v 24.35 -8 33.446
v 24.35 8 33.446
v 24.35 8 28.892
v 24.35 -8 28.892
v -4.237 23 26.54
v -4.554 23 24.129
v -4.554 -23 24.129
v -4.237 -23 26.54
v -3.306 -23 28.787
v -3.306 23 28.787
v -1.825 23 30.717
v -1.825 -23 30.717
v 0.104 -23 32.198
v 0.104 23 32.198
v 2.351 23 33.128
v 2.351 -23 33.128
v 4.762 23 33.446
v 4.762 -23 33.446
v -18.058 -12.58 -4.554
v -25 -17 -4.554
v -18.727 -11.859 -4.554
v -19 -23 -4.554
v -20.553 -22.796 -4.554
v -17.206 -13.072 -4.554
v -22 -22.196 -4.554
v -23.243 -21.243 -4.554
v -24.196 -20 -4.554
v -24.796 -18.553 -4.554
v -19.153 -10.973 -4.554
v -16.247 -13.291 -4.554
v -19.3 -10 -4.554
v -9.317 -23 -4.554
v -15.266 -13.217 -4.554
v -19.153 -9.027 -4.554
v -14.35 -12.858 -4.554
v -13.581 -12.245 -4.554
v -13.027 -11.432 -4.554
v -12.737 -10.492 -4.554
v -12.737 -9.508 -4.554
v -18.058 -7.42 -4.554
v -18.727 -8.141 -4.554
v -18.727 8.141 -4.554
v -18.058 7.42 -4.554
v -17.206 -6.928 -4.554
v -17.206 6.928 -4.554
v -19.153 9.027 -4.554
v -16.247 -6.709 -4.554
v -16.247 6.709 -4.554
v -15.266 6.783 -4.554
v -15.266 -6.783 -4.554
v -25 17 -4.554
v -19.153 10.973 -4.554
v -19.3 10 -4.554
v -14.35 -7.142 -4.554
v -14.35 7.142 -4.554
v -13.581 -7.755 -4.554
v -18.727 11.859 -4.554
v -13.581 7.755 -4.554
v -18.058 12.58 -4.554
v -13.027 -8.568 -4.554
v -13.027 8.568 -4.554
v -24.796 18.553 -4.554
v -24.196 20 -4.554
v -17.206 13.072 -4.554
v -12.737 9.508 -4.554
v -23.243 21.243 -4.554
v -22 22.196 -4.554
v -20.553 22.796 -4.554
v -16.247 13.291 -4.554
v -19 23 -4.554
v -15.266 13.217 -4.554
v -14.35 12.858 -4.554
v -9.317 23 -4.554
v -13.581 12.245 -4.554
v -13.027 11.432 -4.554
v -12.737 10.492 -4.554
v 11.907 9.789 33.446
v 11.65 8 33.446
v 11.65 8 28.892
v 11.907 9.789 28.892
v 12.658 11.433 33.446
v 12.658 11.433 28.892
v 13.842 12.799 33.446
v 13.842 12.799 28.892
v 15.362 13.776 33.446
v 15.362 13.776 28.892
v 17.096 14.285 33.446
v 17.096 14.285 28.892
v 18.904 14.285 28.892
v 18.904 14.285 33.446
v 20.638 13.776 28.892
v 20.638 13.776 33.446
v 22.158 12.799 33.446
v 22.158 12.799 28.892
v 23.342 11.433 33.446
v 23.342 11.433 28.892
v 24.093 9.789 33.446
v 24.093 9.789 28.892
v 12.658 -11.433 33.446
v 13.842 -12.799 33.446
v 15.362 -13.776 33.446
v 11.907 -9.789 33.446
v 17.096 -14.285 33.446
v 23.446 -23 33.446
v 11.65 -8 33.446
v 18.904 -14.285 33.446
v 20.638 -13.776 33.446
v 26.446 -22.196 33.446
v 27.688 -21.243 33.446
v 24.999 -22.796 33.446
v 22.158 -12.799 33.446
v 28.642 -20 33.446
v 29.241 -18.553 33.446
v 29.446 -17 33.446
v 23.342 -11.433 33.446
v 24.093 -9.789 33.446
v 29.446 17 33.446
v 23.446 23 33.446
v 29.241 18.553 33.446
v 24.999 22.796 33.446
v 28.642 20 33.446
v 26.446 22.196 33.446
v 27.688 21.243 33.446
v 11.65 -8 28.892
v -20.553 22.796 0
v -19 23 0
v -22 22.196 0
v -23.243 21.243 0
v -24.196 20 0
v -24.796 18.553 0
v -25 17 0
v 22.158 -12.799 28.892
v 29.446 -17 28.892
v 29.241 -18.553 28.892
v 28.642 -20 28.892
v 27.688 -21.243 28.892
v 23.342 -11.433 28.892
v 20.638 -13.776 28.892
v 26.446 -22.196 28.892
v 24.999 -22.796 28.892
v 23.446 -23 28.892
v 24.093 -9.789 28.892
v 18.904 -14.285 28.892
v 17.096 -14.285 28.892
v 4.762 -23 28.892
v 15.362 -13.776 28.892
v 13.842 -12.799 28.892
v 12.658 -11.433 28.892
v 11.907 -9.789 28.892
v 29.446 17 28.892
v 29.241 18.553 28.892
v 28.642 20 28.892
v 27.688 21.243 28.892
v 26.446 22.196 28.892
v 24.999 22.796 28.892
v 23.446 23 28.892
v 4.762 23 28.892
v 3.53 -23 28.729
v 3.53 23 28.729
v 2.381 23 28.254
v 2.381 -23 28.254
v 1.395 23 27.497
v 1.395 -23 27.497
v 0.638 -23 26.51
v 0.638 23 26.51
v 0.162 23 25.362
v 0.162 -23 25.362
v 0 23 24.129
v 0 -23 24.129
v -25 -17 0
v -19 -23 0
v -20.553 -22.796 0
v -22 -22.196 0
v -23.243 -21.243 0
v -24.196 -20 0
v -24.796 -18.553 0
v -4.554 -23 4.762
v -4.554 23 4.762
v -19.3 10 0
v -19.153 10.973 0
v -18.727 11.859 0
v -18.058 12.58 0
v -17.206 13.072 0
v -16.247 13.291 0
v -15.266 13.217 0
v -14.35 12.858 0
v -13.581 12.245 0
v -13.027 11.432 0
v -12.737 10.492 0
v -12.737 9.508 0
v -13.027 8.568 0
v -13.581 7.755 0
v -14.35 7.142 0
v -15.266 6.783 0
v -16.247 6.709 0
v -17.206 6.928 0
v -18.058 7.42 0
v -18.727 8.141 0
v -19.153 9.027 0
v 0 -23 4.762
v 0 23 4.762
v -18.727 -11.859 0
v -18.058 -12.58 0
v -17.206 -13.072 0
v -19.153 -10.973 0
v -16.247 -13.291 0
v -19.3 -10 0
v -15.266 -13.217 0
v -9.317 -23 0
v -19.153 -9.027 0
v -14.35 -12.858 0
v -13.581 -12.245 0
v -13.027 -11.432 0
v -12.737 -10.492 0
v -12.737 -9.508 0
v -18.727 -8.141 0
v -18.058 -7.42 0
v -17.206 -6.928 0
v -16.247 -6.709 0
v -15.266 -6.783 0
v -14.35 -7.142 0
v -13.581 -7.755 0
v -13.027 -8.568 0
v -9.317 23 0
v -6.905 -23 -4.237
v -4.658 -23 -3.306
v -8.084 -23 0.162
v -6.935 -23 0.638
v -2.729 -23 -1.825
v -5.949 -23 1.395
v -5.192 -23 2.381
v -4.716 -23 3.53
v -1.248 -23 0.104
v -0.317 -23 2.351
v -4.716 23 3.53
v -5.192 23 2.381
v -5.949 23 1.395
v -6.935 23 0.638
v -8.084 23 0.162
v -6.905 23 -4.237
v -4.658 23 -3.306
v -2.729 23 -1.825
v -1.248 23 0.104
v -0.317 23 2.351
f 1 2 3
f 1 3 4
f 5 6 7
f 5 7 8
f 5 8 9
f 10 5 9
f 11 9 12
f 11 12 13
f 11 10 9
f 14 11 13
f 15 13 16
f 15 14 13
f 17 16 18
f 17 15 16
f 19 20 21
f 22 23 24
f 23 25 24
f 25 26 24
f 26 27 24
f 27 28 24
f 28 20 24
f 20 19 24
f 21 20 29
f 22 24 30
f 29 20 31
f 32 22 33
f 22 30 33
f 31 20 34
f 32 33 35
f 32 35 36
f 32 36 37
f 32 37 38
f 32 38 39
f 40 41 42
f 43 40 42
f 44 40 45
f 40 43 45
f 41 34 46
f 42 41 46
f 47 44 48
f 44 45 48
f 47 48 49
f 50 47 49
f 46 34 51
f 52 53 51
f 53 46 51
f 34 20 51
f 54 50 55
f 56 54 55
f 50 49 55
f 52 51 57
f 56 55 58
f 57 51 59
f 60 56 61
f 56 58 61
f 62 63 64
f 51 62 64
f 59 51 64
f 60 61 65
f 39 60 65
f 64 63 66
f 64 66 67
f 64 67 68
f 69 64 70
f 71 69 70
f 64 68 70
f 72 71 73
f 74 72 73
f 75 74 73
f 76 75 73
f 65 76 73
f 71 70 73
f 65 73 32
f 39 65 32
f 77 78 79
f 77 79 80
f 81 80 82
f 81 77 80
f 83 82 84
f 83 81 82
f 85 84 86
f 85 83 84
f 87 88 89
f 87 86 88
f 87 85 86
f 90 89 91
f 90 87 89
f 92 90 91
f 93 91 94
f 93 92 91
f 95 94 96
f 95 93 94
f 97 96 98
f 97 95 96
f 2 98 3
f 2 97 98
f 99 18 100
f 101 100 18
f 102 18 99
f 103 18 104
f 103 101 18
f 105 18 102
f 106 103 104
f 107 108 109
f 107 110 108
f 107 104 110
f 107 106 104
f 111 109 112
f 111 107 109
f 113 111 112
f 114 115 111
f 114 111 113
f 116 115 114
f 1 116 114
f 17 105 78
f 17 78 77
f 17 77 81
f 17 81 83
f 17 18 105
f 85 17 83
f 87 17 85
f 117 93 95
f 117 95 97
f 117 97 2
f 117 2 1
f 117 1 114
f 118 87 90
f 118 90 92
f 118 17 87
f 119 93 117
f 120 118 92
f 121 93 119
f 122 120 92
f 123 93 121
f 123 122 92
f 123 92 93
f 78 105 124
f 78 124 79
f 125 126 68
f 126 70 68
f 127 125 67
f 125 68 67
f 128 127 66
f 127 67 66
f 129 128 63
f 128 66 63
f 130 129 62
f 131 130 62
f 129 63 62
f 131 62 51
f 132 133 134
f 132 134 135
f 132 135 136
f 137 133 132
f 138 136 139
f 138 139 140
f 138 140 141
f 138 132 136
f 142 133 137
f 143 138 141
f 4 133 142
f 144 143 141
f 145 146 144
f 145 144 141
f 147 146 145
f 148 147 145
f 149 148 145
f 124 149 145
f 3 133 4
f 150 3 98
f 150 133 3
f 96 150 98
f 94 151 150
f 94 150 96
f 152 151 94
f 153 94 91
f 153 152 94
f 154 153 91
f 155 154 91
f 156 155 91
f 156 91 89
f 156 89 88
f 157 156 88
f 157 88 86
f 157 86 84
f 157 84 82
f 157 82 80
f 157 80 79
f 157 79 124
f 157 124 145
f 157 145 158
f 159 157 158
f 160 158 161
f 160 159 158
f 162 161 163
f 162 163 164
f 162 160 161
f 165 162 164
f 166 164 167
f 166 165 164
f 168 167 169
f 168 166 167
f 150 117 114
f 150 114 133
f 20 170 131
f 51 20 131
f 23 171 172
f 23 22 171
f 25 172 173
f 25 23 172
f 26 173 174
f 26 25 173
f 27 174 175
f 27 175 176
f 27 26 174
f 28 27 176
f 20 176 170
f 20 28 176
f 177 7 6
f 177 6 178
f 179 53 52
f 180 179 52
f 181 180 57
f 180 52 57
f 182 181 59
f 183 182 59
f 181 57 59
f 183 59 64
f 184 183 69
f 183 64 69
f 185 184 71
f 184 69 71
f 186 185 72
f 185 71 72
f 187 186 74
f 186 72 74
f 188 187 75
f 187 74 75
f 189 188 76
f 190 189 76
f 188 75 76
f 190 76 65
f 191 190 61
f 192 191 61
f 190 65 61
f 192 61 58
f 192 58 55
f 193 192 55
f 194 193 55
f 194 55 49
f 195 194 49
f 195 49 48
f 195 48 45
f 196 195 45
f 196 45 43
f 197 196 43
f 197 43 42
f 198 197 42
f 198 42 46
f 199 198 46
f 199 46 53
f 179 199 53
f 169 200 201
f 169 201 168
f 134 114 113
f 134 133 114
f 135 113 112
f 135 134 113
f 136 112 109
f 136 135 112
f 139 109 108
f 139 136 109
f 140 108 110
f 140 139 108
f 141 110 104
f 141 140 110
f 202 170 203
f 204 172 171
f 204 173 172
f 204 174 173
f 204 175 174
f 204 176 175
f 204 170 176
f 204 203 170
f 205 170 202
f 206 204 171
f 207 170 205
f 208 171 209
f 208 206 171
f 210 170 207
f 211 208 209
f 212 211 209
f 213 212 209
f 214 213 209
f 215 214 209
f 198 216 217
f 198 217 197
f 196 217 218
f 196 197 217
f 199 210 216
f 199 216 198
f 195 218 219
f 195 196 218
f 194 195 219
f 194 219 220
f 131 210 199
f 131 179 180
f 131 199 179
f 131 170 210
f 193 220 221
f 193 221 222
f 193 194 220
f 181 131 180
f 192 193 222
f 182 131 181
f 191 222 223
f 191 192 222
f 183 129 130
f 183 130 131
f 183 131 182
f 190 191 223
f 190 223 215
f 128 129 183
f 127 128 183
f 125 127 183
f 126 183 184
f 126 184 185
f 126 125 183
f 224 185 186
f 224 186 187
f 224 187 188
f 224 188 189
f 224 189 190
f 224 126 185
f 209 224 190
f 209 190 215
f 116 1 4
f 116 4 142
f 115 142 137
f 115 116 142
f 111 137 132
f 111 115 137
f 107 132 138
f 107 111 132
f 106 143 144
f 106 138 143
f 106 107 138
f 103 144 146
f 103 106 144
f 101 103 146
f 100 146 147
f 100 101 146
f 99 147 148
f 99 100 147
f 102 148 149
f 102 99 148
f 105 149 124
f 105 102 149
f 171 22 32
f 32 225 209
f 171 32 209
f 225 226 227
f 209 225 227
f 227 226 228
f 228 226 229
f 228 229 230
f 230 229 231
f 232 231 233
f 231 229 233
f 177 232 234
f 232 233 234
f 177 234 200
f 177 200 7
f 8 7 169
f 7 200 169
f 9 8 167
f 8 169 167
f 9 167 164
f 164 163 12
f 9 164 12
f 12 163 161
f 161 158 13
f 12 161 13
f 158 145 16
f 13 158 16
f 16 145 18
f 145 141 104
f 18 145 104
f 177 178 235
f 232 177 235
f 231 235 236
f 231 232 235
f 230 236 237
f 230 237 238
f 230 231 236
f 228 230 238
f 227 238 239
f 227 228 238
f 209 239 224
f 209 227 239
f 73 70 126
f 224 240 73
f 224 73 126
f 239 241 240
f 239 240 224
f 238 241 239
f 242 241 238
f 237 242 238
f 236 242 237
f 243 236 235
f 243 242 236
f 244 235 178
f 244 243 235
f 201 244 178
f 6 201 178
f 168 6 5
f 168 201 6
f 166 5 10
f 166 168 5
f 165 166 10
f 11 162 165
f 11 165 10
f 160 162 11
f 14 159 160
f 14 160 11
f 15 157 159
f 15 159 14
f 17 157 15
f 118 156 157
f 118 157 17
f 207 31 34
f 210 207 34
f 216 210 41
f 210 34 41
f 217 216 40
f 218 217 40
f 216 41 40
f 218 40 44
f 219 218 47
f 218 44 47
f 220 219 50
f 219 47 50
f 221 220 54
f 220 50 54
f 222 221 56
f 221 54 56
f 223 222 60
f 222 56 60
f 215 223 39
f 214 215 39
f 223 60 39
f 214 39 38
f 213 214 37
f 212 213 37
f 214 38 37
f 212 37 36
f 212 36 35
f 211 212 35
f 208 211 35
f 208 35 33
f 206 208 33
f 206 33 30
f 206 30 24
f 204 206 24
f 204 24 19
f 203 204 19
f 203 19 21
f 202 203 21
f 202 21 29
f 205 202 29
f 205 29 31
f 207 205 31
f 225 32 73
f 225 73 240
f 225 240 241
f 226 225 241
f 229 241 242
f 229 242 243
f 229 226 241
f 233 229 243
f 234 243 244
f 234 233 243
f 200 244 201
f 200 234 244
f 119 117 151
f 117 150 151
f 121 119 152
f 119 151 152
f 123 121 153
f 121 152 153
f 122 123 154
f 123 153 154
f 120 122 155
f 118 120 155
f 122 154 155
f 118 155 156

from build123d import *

# Parameters (mm, degrees)
SKETCH1_W                    = 25
SKETCH1_H                    = 46
BASE_FLANGE1_DEPTH           = 4.55422
EDGE_FLANGE2_STRIP_W         = 27.74188
EDGE_FLANGE2_STRIP_H         = 4.55422
EDGE_FLANGE2_STRIP_CUT_DEPTH = 46
EDGE_FLANGE2_DEPTH           = 46
EDGE_FLANGE3_STRIP_W         = 27.74188
EDGE_FLANGE3_STRIP_H         = 4.55422
EDGE_FLANGE3_STRIP_CUT_DEPTH = 46
EDGE_FLANGE3_DEPTH           = 46
FILLET1_R                    = 6
M6_CLEARANCE_HOLE1_D         = 6.6
CUT_EXTRUDE1_DEPTH           = 76.830940915


# Sheet-metal steps are written as plain solids
with BuildPart() as part:
    # Sketch1 → Base-Flange1 (new body)
    with BuildSketch(Plane.XY):
        with Locations((-12.5, 0)):
            Rectangle(SKETCH1_W, SKETCH1_H)
    extrude(amount=-BASE_FLANGE1_DEPTH)

    # Edge-Flange2 strip (across the edge) → Edge-Flange2 strip cut (cut)
    with BuildSketch(Plane(origin=(0, -23, 0), x_dir=(-1, 0, 0), z_dir=(0, 1, 0))):
        with Locations((-4.55422, -2.27711)):
            Rectangle(EDGE_FLANGE2_STRIP_W, EDGE_FLANGE2_STRIP_H)
    extrude(amount=EDGE_FLANGE2_STRIP_CUT_DEPTH, mode=Mode.SUBTRACT)

    # Edge-Flange2 section (across the edge) → Edge-Flange2 (add)
    with BuildSketch(Plane(origin=(0, -23, 0), x_dir=(-1, 0, 0), z_dir=(0, 1, 0))):
        with BuildLine():
            Line((0, 4.7625), (0, 33.44578))
            Line((0, 33.44578), (4.55422, 33.44578))
            Line((4.55422, 33.44578), (4.55422, 4.7625))
            ThreePointArc((4.55422, 4.7625), (5.949123955, 1.394903955), (9.31672, 0))
            Line((9.31672, 0), (9.31672, -4.55422))
            ThreePointArc((9.31672, -4.55422), (2.72880411, -1.82541589), (0, 4.7625))
        make_face()
    extrude(amount=EDGE_FLANGE2_DEPTH)

    # Edge-Flange3 strip (across the edge) → Edge-Flange3 strip cut (cut)
    with BuildSketch(Plane(origin=(0, 23, 33.44578), x_dir=(0, 0, -1), z_dir=(0, -1, 0))):
        with Locations((-4.55422, -2.27711)):
            Rectangle(EDGE_FLANGE3_STRIP_W, EDGE_FLANGE3_STRIP_H)
    extrude(amount=EDGE_FLANGE3_STRIP_CUT_DEPTH, mode=Mode.SUBTRACT)

    # Edge-Flange3 section (across the edge) → Edge-Flange3 (add)
    with BuildSketch(Plane(origin=(0, 23, 33.44578), x_dir=(0, 0, -1), z_dir=(0, -1, 0))):
        with BuildLine():
            Line((0, 4.7625), (0, 29.44578))
            Line((0, 29.44578), (4.55422, 29.44578))
            Line((4.55422, 29.44578), (4.55422, 4.7625))
            ThreePointArc((4.55422, 4.7625), (5.949123955, 1.394903955), (9.31672, 0))
            Line((9.31672, 0), (9.31672, -4.55422))
            ThreePointArc((9.31672, -4.55422), (2.72880411, -1.82541589), (0, 4.7625))
        make_face()
    extrude(amount=EDGE_FLANGE3_DEPTH)

    # Fillet1
    fillet1_edges = [part.edges().sort_by_distance(p)[0] for p in [
        (29.44578, 23, 31.16867),
        (29.44578, -23, 31.16867),
        (-25, 23, -2.27711),
        (-25, -23, -2.27711),
    ]]
    fillet(fillet1_edges, radius=FILLET1_R)

    # M6 Clearance Hole1 (through all)
    with Locations(Plane.XY):
        with Locations((-16, 10), (-16, -10)):
            Hole(M6_CLEARANCE_HOLE1_D / 2)

    # Sketch12 → Cut-Extrude1 (cut, through all)
    with BuildSketch(Plane(origin=(-32.01422, 0, 33.44578), x_dir=(1, 0, 0), z_dir=(0, 0, 1))):
        with BuildLine():
            Line((43.66422, -8), (43.66422, 8))
            ThreePointArc((43.66422, 8), (50.01422, 14.35), (56.36422, 8))
            Line((56.36422, 8), (56.36422, -8))
            ThreePointArc((56.36422, -8), (50.01422, -14.35), (43.66422, -8))
        make_face()
    extrude(amount=-CUT_EXTRUDE1_DEPTH, mode=Mode.SUBTRACT)


solid = part.part
